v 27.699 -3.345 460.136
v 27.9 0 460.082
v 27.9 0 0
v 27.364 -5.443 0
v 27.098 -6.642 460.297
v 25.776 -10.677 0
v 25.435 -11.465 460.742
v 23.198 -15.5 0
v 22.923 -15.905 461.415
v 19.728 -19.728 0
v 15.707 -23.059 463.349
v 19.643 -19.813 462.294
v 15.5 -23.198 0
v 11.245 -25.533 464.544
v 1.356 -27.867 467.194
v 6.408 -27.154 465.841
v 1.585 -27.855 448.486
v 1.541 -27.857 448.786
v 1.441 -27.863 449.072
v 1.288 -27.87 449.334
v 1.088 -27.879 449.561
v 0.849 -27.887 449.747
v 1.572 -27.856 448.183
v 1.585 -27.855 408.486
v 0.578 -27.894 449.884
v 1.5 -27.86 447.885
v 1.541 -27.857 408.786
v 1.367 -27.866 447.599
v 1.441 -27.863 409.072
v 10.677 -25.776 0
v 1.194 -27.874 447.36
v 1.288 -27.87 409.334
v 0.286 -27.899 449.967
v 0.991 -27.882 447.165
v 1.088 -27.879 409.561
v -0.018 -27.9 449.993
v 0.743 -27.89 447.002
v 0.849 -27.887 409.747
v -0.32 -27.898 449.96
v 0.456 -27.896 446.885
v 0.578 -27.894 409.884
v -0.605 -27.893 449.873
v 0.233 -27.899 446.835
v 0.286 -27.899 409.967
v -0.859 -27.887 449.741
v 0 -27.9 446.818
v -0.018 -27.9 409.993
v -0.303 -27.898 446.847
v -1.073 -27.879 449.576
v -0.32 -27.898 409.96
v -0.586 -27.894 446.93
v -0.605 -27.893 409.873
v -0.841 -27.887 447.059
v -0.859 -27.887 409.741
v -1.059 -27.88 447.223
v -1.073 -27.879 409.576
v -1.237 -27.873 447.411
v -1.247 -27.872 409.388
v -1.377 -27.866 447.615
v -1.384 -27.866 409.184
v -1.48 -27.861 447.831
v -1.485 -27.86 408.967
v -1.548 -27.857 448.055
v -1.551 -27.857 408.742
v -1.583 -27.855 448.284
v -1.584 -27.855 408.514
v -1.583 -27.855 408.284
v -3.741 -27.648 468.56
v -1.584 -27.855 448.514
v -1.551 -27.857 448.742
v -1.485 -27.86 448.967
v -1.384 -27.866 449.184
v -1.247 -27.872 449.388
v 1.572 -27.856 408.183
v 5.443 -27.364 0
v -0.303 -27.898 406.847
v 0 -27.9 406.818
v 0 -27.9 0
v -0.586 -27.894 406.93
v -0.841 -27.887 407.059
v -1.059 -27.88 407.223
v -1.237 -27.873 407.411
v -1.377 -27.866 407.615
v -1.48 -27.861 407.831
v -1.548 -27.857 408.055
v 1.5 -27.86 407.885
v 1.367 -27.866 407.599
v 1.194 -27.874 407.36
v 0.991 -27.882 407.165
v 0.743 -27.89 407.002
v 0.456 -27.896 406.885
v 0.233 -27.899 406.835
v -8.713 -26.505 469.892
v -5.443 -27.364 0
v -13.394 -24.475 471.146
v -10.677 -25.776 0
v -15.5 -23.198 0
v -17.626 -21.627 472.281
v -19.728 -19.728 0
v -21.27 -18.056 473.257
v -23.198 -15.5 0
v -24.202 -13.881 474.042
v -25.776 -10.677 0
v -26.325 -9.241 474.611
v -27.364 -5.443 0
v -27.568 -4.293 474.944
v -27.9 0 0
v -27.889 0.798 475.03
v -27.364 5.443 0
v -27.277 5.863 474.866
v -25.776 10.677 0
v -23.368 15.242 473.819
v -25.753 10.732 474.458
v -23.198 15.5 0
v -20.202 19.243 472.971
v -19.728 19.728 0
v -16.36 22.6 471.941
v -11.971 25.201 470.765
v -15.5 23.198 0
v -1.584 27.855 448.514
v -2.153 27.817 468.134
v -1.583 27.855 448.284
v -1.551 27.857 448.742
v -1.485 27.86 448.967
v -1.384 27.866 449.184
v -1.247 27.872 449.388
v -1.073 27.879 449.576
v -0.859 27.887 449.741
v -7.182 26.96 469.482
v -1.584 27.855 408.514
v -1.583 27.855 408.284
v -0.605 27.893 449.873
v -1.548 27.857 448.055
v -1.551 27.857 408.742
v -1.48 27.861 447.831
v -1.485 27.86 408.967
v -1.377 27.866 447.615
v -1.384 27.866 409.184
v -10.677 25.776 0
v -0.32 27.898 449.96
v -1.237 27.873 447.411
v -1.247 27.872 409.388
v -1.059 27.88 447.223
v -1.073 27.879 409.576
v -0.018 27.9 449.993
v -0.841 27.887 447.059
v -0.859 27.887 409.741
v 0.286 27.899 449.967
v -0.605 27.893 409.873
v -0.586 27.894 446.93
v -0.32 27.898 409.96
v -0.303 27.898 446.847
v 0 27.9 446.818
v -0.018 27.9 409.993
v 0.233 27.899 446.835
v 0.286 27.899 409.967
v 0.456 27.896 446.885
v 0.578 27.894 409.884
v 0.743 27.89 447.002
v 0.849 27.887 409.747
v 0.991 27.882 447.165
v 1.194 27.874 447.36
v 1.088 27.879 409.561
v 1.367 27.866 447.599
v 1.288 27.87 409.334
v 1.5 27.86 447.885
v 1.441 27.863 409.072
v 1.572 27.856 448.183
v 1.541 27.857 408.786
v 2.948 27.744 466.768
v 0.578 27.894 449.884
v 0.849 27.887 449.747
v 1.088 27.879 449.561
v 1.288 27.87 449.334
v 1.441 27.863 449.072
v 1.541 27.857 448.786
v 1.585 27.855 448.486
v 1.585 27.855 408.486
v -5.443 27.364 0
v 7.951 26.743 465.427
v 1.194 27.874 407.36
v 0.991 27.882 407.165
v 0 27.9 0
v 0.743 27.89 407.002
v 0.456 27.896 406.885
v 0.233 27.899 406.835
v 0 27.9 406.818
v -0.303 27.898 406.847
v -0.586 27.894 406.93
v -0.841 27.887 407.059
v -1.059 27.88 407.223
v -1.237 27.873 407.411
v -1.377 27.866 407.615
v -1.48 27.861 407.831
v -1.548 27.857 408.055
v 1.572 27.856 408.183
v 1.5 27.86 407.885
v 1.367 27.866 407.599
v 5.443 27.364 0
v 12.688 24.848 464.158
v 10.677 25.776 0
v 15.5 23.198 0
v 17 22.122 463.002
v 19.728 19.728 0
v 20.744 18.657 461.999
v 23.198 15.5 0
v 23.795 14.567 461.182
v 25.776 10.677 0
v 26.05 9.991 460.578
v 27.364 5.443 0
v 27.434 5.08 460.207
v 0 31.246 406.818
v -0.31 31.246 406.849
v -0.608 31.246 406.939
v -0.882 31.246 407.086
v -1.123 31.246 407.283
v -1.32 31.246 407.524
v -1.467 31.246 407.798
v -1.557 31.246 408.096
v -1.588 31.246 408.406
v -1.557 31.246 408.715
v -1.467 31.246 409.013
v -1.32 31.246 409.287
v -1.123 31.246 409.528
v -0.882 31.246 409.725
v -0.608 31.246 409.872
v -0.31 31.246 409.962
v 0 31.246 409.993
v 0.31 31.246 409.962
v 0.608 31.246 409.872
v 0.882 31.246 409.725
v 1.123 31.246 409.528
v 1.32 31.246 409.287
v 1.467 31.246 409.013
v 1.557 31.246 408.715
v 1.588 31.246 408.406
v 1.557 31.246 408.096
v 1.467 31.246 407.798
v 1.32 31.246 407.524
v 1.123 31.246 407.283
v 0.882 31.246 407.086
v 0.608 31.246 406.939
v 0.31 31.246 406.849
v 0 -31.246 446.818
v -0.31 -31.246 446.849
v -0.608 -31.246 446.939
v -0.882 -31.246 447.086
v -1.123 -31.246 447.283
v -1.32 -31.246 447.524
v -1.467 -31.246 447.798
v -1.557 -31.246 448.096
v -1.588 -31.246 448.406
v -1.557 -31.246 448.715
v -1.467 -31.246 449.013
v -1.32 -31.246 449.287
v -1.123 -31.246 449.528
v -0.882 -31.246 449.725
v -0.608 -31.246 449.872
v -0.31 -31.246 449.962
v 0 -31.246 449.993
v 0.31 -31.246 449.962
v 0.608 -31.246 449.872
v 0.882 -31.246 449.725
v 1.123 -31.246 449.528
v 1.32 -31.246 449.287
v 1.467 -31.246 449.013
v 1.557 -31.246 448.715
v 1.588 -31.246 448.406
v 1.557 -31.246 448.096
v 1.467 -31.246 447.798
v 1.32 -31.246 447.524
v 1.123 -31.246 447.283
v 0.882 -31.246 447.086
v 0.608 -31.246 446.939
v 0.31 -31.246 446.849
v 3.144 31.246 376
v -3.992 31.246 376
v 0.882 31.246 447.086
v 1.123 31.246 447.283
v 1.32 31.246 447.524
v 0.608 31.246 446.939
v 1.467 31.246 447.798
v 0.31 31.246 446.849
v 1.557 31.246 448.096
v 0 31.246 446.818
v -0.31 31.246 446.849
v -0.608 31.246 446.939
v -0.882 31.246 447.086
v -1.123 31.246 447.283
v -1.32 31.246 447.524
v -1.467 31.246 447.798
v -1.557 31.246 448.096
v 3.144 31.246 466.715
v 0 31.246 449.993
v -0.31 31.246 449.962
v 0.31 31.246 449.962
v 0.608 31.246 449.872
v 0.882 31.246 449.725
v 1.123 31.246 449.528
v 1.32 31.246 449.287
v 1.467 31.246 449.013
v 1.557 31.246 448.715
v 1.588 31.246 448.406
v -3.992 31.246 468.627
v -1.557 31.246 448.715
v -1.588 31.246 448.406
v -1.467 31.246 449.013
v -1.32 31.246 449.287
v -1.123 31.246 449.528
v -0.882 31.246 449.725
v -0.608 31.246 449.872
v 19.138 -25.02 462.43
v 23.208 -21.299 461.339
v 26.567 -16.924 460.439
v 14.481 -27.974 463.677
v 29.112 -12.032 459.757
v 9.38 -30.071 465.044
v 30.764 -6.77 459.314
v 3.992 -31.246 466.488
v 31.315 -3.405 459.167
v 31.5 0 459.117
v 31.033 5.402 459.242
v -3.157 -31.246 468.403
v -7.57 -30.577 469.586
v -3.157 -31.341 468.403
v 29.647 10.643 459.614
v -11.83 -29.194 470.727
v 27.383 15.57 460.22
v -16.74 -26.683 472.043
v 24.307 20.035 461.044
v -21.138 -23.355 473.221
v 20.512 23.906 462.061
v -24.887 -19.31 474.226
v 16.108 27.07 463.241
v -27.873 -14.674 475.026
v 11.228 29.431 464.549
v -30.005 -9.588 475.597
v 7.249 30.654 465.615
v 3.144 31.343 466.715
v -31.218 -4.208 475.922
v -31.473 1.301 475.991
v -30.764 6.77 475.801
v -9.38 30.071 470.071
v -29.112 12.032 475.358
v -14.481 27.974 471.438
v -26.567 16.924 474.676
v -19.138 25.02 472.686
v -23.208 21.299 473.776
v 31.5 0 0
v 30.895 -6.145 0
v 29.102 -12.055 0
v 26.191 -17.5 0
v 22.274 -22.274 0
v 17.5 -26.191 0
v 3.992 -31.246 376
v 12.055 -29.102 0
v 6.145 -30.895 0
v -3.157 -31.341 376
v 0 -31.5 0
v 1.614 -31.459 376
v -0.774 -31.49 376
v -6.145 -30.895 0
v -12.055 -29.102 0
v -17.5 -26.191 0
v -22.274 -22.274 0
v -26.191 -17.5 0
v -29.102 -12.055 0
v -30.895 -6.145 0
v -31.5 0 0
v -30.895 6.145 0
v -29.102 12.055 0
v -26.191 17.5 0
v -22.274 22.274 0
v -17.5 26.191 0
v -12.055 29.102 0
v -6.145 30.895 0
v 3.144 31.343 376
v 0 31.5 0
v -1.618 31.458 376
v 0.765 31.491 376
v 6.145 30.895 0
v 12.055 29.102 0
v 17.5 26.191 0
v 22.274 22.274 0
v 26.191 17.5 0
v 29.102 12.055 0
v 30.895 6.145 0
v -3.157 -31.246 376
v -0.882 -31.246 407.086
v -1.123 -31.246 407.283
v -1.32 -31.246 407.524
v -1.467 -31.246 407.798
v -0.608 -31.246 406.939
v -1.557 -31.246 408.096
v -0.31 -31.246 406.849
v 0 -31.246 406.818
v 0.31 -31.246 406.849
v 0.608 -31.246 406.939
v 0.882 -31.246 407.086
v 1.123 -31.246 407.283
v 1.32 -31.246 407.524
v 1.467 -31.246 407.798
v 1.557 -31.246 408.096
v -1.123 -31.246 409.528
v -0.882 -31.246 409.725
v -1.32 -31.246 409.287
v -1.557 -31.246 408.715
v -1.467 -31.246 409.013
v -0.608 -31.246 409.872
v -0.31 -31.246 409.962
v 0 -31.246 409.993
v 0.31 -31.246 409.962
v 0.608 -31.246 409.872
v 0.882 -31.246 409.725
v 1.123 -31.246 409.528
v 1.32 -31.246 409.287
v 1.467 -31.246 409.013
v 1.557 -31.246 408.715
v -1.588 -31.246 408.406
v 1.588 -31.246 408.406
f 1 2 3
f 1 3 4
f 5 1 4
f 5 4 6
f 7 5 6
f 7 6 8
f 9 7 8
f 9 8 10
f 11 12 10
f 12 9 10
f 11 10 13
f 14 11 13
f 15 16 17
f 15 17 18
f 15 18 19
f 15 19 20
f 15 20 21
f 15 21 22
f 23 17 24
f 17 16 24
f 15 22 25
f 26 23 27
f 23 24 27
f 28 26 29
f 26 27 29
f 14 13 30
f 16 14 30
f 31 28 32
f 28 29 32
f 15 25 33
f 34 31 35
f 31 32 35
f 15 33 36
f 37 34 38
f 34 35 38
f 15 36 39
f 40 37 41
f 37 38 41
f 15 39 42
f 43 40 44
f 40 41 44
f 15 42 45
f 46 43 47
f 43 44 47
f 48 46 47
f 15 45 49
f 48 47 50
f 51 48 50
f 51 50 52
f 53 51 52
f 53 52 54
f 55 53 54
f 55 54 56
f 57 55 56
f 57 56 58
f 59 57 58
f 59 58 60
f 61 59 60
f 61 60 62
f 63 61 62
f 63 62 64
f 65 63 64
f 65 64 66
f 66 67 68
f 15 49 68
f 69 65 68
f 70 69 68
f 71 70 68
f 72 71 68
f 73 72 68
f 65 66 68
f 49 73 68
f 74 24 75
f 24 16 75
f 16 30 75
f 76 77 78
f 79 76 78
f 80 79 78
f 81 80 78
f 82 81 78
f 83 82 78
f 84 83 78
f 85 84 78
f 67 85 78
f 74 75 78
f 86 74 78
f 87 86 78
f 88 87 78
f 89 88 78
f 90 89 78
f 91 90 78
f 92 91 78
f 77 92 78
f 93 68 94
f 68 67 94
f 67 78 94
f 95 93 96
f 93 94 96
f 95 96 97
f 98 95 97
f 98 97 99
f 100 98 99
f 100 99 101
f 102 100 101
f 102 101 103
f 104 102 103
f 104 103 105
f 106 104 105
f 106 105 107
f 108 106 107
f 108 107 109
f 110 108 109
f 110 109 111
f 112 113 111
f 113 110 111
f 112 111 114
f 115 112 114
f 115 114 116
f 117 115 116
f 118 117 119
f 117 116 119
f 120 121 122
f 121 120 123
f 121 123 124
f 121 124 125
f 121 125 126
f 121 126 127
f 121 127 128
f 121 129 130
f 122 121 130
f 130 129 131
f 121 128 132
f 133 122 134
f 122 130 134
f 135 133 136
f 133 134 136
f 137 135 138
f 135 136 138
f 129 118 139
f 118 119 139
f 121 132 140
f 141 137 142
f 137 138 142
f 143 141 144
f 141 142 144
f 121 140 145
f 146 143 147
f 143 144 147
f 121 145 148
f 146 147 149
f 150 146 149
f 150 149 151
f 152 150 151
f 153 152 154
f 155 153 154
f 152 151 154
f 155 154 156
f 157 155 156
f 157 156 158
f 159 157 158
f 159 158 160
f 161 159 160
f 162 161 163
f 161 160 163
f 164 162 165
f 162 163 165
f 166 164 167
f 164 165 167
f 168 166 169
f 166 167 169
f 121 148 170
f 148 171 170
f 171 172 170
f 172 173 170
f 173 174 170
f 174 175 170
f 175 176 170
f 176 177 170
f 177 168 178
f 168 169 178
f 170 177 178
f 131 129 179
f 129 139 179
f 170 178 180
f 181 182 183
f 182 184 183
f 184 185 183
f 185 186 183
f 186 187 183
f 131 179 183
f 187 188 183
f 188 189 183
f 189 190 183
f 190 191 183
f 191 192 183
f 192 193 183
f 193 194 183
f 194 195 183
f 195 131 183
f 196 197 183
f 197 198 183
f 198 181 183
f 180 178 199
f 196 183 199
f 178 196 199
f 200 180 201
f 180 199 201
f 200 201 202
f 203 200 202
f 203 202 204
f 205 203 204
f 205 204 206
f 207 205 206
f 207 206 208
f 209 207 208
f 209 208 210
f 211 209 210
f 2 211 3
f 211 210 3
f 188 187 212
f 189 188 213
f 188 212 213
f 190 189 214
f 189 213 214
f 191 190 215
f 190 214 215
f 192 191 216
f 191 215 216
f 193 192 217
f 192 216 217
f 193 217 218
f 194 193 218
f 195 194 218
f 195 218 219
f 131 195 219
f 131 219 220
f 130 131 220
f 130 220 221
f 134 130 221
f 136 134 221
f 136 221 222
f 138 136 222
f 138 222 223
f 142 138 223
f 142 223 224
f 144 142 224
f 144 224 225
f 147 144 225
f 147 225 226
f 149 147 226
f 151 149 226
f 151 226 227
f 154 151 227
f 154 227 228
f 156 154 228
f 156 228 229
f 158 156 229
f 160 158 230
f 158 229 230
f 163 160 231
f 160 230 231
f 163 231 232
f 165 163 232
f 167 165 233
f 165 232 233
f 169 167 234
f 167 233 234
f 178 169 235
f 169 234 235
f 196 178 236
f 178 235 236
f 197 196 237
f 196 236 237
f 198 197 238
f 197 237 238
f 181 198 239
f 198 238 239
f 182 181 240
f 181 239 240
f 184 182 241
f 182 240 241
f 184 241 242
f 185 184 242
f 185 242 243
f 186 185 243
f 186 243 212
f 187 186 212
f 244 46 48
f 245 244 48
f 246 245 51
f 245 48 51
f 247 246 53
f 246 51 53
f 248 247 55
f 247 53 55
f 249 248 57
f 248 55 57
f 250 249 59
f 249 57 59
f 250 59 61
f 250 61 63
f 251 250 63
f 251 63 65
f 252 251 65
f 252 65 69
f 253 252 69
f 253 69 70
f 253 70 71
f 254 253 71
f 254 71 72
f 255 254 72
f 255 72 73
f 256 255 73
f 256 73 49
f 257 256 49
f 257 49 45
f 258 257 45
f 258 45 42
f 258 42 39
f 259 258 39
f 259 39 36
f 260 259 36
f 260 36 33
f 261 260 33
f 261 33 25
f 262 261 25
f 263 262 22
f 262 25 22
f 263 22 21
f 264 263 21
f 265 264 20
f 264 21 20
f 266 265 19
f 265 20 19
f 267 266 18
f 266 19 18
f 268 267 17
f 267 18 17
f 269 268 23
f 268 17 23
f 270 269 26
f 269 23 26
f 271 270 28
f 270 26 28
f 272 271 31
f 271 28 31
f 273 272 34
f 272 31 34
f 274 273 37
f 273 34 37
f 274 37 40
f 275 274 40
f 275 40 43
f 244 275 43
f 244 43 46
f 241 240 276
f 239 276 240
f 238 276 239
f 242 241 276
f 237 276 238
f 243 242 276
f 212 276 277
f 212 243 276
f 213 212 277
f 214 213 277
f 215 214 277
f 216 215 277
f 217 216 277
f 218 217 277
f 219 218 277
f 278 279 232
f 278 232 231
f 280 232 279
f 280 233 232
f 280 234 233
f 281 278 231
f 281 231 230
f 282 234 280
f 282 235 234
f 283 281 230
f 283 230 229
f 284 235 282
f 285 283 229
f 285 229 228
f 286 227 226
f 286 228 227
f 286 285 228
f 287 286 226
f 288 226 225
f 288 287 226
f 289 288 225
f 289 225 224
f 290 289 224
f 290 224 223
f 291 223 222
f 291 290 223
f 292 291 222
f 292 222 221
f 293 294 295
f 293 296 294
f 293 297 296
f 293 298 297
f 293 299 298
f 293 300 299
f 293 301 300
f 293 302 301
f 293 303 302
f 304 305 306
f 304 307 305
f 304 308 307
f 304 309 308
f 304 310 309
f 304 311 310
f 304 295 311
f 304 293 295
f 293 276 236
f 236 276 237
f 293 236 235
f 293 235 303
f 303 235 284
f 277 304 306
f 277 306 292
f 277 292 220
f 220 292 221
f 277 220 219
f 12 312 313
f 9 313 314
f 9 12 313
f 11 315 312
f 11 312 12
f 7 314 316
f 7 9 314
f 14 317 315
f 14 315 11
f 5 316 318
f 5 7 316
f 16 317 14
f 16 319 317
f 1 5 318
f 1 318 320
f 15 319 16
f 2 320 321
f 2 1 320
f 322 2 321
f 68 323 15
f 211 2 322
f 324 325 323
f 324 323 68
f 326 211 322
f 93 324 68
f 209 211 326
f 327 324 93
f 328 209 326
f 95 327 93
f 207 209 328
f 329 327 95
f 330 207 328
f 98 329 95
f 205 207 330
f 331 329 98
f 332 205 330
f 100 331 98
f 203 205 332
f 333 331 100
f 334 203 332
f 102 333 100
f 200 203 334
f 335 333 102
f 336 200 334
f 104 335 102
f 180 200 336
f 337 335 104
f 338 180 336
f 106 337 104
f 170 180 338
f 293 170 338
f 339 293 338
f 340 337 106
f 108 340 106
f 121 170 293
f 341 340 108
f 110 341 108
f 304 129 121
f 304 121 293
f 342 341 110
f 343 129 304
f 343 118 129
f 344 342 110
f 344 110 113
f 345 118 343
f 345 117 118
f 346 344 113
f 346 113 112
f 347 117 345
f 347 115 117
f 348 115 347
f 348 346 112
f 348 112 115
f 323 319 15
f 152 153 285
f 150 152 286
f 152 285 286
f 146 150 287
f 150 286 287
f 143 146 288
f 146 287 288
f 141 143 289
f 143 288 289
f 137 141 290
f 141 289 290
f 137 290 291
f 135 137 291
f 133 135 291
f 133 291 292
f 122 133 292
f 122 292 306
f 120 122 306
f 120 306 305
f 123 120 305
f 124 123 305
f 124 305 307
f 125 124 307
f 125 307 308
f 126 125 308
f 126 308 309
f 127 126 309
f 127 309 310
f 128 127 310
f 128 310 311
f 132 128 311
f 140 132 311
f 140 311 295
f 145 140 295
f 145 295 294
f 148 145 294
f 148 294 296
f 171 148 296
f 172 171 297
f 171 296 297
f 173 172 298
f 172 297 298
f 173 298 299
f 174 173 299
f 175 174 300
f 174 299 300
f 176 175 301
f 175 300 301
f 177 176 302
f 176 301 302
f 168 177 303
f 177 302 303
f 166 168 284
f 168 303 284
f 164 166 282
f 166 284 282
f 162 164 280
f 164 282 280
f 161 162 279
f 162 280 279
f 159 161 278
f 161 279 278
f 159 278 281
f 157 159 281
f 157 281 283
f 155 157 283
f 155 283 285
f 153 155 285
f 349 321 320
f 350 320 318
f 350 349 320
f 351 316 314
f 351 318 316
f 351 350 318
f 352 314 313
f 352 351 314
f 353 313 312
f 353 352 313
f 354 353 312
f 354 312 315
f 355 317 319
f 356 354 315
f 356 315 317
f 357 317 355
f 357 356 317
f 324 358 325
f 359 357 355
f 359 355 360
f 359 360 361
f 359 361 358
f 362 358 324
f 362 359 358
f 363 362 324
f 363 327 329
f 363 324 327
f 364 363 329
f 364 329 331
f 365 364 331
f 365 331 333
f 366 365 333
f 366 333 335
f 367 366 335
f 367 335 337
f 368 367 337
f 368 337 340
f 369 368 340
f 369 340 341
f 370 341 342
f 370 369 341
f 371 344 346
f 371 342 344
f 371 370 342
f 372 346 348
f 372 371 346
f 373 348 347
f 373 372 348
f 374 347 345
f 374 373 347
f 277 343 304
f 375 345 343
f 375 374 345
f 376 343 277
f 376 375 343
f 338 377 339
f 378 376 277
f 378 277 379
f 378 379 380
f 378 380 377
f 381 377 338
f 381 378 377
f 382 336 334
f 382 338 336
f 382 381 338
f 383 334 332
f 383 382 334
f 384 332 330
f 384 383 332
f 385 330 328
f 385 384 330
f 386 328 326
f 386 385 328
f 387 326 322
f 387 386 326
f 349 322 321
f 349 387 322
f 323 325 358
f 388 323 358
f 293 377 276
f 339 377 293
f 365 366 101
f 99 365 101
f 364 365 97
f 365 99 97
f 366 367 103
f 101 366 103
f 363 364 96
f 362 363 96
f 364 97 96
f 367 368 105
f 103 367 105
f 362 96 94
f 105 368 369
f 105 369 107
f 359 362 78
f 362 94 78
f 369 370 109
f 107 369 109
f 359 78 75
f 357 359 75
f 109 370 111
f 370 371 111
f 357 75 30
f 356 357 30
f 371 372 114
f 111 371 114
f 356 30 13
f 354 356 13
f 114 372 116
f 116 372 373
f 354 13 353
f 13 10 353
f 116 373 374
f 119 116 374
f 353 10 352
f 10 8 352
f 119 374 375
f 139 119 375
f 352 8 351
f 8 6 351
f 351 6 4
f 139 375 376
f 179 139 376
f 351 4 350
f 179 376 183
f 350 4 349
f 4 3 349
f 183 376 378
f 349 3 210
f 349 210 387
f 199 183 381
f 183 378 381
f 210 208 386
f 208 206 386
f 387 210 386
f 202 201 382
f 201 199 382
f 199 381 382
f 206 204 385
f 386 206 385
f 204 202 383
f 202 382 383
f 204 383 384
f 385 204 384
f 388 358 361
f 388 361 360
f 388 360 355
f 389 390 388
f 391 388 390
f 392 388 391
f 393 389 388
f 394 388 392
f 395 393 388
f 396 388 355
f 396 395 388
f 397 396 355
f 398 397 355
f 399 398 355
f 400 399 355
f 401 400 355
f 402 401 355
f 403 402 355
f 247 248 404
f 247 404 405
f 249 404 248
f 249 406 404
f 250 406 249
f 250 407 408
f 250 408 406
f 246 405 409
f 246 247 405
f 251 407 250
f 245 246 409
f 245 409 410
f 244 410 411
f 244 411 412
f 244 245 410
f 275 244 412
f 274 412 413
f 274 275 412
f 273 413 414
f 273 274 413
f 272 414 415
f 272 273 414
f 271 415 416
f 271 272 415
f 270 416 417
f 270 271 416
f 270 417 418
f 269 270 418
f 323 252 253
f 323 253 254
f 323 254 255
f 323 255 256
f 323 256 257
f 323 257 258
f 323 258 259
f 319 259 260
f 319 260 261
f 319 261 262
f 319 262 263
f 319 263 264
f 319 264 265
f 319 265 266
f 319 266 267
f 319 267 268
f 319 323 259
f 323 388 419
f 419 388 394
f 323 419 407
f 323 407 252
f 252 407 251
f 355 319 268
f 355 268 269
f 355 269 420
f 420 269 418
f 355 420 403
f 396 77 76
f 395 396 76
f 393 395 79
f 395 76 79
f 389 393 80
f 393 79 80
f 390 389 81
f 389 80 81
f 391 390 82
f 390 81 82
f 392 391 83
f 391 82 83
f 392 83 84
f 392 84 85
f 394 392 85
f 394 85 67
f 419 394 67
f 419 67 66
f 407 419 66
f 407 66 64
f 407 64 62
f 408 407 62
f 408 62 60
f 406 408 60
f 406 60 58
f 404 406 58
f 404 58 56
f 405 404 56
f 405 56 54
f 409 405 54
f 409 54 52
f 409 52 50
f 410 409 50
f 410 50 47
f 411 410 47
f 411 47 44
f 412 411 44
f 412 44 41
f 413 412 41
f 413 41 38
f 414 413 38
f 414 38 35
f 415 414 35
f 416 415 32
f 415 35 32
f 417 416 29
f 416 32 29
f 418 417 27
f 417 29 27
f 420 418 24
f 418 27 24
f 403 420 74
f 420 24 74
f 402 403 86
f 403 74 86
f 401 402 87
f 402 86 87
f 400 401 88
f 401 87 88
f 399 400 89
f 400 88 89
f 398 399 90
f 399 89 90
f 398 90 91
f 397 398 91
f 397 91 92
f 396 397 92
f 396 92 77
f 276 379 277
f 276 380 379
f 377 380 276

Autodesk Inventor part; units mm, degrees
sketch "Sketch1" plane through (0, 0, 0) normal (0, 0, 1) x (1, 0, 0)
  circle A0 centre (0, 0) radius 31.5
  circle A1 centre (0, 0) radius 27.9
  dimension "d0" = 63
  dimension "d2" = 3.6
extrude "Extrusion1" add sketch "Sketch1" along normal blind 476
sketch "Sketch18" plane through (0, 0, 476) normal (0, 0, 1) x (1, 0, 0)
  circle A0 centre (0, 0) radius 27.9 projected
  circle A1 centre (0, 0) radius 31.5 projected
  point P0 (-31.5, 0)
ref_plane "Work Plane9" through (-31.5, 0, 476) normal (0.2588, 0, 0.9659) x (0, 1, 0)
sketch "Sketch19" plane through (-31.5, 0, 476) normal (0.2588, 0, 0.9659) x (0, 1, 0)
  line L0 (-31.6137, -94.9476) -> (64.4261, -94.9476)
  line L1 (64.4261, -94.9476) -> (64.4261, 6.6524)
  line L2 (64.4261, 6.6524) -> (-31.6137, 6.6524)
  line L3 (-31.6137, 6.6524) -> (-31.6137, -94.9476)
  point P0 (0, -153.6245)
  dimension "d61" = 101.6
extrude "Extrusion11" cut sketch "Sketch19" along normal blind 25.4
sketch "Sketch20" plane through (0, 0, 0) normal (0, 0, -1) x (-1, 0, 0)
  circle A0 centre (0, 0) radius 27.9 projected
  circle A1 centre (0, 0) radius 31.5 projected
  point P0 (0, 31.5)
  point P1 (0, -31.5)
ref_plane "Work Plane10" through (0, 31.5, 0) normal (0, 1, 0) x (-1, 0, 0)
ref_plane "Work Plane11" through (0, -31.5, 0) normal (0, -1, 0) x (1, 0, 0)
sketch "Sketch21" plane through (0, 31.5, 0) normal (0, 1, 0) x (-1, 0, 0)
  line L0 (-3.1444, 476) -> (6.8556, 476)
  line L1 (6.8556, 476) -> (6.8556, 376)
  line L2 (6.8556, 376) -> (-3.1444, 376)
  line L3 (-3.1444, 376) -> (-3.1444, 476)
  line L4 (1.8556, 476) -> (1.8556, 376) construction
  point P0 (0, 0)
  dimension "d64" = 10
  dimension "d65" = 100
  dimension "d82" = 376
extrude "flat1" cut sketch "Sketch21" against normal blind 0.254
sketch "Sketch22" plane through (0, -31.5, 0) normal (0, -1, 0) x (1, 0, 0)
  line L0 (-3.1568, 376) -> (6.8432, 376)
  line L1 (6.8432, 376) -> (6.8432, 476)
  line L2 (6.8432, 476) -> (-3.1568, 476)
  line L3 (-3.1568, 476) -> (-3.1568, 376)
  line L4 (1.8432, 476) -> (1.8432, 376) construction
  point P0 (0, 0)
  dimension "d68" = 10
  dimension "d69" = 100
  dimension "d83" = 376
extrude "flat2" cut sketch "Sketch22" against normal blind 0.254
sketch "Sketch23" plane through (0, -31.246, 0) normal (0, -1, 0) x (1, 0, 0)
  circle A0 centre (0, 448.4055) radius 1.4603
  circle A1 centre (0, 408.4055) radius 1.4603
  point P0 (-3.1568, 468.4055)
  point P1 (0, 0)
  dimension "d73" = 40
  dimension "d74" = 20
hole "Hole1" at (0, -31.246, 448.4055) at (0, -31.246, 408.4055) direction (0, 1, 0) diameter 3.175 end through all
properties part number "2r2scs" material "PVC-Piping"
